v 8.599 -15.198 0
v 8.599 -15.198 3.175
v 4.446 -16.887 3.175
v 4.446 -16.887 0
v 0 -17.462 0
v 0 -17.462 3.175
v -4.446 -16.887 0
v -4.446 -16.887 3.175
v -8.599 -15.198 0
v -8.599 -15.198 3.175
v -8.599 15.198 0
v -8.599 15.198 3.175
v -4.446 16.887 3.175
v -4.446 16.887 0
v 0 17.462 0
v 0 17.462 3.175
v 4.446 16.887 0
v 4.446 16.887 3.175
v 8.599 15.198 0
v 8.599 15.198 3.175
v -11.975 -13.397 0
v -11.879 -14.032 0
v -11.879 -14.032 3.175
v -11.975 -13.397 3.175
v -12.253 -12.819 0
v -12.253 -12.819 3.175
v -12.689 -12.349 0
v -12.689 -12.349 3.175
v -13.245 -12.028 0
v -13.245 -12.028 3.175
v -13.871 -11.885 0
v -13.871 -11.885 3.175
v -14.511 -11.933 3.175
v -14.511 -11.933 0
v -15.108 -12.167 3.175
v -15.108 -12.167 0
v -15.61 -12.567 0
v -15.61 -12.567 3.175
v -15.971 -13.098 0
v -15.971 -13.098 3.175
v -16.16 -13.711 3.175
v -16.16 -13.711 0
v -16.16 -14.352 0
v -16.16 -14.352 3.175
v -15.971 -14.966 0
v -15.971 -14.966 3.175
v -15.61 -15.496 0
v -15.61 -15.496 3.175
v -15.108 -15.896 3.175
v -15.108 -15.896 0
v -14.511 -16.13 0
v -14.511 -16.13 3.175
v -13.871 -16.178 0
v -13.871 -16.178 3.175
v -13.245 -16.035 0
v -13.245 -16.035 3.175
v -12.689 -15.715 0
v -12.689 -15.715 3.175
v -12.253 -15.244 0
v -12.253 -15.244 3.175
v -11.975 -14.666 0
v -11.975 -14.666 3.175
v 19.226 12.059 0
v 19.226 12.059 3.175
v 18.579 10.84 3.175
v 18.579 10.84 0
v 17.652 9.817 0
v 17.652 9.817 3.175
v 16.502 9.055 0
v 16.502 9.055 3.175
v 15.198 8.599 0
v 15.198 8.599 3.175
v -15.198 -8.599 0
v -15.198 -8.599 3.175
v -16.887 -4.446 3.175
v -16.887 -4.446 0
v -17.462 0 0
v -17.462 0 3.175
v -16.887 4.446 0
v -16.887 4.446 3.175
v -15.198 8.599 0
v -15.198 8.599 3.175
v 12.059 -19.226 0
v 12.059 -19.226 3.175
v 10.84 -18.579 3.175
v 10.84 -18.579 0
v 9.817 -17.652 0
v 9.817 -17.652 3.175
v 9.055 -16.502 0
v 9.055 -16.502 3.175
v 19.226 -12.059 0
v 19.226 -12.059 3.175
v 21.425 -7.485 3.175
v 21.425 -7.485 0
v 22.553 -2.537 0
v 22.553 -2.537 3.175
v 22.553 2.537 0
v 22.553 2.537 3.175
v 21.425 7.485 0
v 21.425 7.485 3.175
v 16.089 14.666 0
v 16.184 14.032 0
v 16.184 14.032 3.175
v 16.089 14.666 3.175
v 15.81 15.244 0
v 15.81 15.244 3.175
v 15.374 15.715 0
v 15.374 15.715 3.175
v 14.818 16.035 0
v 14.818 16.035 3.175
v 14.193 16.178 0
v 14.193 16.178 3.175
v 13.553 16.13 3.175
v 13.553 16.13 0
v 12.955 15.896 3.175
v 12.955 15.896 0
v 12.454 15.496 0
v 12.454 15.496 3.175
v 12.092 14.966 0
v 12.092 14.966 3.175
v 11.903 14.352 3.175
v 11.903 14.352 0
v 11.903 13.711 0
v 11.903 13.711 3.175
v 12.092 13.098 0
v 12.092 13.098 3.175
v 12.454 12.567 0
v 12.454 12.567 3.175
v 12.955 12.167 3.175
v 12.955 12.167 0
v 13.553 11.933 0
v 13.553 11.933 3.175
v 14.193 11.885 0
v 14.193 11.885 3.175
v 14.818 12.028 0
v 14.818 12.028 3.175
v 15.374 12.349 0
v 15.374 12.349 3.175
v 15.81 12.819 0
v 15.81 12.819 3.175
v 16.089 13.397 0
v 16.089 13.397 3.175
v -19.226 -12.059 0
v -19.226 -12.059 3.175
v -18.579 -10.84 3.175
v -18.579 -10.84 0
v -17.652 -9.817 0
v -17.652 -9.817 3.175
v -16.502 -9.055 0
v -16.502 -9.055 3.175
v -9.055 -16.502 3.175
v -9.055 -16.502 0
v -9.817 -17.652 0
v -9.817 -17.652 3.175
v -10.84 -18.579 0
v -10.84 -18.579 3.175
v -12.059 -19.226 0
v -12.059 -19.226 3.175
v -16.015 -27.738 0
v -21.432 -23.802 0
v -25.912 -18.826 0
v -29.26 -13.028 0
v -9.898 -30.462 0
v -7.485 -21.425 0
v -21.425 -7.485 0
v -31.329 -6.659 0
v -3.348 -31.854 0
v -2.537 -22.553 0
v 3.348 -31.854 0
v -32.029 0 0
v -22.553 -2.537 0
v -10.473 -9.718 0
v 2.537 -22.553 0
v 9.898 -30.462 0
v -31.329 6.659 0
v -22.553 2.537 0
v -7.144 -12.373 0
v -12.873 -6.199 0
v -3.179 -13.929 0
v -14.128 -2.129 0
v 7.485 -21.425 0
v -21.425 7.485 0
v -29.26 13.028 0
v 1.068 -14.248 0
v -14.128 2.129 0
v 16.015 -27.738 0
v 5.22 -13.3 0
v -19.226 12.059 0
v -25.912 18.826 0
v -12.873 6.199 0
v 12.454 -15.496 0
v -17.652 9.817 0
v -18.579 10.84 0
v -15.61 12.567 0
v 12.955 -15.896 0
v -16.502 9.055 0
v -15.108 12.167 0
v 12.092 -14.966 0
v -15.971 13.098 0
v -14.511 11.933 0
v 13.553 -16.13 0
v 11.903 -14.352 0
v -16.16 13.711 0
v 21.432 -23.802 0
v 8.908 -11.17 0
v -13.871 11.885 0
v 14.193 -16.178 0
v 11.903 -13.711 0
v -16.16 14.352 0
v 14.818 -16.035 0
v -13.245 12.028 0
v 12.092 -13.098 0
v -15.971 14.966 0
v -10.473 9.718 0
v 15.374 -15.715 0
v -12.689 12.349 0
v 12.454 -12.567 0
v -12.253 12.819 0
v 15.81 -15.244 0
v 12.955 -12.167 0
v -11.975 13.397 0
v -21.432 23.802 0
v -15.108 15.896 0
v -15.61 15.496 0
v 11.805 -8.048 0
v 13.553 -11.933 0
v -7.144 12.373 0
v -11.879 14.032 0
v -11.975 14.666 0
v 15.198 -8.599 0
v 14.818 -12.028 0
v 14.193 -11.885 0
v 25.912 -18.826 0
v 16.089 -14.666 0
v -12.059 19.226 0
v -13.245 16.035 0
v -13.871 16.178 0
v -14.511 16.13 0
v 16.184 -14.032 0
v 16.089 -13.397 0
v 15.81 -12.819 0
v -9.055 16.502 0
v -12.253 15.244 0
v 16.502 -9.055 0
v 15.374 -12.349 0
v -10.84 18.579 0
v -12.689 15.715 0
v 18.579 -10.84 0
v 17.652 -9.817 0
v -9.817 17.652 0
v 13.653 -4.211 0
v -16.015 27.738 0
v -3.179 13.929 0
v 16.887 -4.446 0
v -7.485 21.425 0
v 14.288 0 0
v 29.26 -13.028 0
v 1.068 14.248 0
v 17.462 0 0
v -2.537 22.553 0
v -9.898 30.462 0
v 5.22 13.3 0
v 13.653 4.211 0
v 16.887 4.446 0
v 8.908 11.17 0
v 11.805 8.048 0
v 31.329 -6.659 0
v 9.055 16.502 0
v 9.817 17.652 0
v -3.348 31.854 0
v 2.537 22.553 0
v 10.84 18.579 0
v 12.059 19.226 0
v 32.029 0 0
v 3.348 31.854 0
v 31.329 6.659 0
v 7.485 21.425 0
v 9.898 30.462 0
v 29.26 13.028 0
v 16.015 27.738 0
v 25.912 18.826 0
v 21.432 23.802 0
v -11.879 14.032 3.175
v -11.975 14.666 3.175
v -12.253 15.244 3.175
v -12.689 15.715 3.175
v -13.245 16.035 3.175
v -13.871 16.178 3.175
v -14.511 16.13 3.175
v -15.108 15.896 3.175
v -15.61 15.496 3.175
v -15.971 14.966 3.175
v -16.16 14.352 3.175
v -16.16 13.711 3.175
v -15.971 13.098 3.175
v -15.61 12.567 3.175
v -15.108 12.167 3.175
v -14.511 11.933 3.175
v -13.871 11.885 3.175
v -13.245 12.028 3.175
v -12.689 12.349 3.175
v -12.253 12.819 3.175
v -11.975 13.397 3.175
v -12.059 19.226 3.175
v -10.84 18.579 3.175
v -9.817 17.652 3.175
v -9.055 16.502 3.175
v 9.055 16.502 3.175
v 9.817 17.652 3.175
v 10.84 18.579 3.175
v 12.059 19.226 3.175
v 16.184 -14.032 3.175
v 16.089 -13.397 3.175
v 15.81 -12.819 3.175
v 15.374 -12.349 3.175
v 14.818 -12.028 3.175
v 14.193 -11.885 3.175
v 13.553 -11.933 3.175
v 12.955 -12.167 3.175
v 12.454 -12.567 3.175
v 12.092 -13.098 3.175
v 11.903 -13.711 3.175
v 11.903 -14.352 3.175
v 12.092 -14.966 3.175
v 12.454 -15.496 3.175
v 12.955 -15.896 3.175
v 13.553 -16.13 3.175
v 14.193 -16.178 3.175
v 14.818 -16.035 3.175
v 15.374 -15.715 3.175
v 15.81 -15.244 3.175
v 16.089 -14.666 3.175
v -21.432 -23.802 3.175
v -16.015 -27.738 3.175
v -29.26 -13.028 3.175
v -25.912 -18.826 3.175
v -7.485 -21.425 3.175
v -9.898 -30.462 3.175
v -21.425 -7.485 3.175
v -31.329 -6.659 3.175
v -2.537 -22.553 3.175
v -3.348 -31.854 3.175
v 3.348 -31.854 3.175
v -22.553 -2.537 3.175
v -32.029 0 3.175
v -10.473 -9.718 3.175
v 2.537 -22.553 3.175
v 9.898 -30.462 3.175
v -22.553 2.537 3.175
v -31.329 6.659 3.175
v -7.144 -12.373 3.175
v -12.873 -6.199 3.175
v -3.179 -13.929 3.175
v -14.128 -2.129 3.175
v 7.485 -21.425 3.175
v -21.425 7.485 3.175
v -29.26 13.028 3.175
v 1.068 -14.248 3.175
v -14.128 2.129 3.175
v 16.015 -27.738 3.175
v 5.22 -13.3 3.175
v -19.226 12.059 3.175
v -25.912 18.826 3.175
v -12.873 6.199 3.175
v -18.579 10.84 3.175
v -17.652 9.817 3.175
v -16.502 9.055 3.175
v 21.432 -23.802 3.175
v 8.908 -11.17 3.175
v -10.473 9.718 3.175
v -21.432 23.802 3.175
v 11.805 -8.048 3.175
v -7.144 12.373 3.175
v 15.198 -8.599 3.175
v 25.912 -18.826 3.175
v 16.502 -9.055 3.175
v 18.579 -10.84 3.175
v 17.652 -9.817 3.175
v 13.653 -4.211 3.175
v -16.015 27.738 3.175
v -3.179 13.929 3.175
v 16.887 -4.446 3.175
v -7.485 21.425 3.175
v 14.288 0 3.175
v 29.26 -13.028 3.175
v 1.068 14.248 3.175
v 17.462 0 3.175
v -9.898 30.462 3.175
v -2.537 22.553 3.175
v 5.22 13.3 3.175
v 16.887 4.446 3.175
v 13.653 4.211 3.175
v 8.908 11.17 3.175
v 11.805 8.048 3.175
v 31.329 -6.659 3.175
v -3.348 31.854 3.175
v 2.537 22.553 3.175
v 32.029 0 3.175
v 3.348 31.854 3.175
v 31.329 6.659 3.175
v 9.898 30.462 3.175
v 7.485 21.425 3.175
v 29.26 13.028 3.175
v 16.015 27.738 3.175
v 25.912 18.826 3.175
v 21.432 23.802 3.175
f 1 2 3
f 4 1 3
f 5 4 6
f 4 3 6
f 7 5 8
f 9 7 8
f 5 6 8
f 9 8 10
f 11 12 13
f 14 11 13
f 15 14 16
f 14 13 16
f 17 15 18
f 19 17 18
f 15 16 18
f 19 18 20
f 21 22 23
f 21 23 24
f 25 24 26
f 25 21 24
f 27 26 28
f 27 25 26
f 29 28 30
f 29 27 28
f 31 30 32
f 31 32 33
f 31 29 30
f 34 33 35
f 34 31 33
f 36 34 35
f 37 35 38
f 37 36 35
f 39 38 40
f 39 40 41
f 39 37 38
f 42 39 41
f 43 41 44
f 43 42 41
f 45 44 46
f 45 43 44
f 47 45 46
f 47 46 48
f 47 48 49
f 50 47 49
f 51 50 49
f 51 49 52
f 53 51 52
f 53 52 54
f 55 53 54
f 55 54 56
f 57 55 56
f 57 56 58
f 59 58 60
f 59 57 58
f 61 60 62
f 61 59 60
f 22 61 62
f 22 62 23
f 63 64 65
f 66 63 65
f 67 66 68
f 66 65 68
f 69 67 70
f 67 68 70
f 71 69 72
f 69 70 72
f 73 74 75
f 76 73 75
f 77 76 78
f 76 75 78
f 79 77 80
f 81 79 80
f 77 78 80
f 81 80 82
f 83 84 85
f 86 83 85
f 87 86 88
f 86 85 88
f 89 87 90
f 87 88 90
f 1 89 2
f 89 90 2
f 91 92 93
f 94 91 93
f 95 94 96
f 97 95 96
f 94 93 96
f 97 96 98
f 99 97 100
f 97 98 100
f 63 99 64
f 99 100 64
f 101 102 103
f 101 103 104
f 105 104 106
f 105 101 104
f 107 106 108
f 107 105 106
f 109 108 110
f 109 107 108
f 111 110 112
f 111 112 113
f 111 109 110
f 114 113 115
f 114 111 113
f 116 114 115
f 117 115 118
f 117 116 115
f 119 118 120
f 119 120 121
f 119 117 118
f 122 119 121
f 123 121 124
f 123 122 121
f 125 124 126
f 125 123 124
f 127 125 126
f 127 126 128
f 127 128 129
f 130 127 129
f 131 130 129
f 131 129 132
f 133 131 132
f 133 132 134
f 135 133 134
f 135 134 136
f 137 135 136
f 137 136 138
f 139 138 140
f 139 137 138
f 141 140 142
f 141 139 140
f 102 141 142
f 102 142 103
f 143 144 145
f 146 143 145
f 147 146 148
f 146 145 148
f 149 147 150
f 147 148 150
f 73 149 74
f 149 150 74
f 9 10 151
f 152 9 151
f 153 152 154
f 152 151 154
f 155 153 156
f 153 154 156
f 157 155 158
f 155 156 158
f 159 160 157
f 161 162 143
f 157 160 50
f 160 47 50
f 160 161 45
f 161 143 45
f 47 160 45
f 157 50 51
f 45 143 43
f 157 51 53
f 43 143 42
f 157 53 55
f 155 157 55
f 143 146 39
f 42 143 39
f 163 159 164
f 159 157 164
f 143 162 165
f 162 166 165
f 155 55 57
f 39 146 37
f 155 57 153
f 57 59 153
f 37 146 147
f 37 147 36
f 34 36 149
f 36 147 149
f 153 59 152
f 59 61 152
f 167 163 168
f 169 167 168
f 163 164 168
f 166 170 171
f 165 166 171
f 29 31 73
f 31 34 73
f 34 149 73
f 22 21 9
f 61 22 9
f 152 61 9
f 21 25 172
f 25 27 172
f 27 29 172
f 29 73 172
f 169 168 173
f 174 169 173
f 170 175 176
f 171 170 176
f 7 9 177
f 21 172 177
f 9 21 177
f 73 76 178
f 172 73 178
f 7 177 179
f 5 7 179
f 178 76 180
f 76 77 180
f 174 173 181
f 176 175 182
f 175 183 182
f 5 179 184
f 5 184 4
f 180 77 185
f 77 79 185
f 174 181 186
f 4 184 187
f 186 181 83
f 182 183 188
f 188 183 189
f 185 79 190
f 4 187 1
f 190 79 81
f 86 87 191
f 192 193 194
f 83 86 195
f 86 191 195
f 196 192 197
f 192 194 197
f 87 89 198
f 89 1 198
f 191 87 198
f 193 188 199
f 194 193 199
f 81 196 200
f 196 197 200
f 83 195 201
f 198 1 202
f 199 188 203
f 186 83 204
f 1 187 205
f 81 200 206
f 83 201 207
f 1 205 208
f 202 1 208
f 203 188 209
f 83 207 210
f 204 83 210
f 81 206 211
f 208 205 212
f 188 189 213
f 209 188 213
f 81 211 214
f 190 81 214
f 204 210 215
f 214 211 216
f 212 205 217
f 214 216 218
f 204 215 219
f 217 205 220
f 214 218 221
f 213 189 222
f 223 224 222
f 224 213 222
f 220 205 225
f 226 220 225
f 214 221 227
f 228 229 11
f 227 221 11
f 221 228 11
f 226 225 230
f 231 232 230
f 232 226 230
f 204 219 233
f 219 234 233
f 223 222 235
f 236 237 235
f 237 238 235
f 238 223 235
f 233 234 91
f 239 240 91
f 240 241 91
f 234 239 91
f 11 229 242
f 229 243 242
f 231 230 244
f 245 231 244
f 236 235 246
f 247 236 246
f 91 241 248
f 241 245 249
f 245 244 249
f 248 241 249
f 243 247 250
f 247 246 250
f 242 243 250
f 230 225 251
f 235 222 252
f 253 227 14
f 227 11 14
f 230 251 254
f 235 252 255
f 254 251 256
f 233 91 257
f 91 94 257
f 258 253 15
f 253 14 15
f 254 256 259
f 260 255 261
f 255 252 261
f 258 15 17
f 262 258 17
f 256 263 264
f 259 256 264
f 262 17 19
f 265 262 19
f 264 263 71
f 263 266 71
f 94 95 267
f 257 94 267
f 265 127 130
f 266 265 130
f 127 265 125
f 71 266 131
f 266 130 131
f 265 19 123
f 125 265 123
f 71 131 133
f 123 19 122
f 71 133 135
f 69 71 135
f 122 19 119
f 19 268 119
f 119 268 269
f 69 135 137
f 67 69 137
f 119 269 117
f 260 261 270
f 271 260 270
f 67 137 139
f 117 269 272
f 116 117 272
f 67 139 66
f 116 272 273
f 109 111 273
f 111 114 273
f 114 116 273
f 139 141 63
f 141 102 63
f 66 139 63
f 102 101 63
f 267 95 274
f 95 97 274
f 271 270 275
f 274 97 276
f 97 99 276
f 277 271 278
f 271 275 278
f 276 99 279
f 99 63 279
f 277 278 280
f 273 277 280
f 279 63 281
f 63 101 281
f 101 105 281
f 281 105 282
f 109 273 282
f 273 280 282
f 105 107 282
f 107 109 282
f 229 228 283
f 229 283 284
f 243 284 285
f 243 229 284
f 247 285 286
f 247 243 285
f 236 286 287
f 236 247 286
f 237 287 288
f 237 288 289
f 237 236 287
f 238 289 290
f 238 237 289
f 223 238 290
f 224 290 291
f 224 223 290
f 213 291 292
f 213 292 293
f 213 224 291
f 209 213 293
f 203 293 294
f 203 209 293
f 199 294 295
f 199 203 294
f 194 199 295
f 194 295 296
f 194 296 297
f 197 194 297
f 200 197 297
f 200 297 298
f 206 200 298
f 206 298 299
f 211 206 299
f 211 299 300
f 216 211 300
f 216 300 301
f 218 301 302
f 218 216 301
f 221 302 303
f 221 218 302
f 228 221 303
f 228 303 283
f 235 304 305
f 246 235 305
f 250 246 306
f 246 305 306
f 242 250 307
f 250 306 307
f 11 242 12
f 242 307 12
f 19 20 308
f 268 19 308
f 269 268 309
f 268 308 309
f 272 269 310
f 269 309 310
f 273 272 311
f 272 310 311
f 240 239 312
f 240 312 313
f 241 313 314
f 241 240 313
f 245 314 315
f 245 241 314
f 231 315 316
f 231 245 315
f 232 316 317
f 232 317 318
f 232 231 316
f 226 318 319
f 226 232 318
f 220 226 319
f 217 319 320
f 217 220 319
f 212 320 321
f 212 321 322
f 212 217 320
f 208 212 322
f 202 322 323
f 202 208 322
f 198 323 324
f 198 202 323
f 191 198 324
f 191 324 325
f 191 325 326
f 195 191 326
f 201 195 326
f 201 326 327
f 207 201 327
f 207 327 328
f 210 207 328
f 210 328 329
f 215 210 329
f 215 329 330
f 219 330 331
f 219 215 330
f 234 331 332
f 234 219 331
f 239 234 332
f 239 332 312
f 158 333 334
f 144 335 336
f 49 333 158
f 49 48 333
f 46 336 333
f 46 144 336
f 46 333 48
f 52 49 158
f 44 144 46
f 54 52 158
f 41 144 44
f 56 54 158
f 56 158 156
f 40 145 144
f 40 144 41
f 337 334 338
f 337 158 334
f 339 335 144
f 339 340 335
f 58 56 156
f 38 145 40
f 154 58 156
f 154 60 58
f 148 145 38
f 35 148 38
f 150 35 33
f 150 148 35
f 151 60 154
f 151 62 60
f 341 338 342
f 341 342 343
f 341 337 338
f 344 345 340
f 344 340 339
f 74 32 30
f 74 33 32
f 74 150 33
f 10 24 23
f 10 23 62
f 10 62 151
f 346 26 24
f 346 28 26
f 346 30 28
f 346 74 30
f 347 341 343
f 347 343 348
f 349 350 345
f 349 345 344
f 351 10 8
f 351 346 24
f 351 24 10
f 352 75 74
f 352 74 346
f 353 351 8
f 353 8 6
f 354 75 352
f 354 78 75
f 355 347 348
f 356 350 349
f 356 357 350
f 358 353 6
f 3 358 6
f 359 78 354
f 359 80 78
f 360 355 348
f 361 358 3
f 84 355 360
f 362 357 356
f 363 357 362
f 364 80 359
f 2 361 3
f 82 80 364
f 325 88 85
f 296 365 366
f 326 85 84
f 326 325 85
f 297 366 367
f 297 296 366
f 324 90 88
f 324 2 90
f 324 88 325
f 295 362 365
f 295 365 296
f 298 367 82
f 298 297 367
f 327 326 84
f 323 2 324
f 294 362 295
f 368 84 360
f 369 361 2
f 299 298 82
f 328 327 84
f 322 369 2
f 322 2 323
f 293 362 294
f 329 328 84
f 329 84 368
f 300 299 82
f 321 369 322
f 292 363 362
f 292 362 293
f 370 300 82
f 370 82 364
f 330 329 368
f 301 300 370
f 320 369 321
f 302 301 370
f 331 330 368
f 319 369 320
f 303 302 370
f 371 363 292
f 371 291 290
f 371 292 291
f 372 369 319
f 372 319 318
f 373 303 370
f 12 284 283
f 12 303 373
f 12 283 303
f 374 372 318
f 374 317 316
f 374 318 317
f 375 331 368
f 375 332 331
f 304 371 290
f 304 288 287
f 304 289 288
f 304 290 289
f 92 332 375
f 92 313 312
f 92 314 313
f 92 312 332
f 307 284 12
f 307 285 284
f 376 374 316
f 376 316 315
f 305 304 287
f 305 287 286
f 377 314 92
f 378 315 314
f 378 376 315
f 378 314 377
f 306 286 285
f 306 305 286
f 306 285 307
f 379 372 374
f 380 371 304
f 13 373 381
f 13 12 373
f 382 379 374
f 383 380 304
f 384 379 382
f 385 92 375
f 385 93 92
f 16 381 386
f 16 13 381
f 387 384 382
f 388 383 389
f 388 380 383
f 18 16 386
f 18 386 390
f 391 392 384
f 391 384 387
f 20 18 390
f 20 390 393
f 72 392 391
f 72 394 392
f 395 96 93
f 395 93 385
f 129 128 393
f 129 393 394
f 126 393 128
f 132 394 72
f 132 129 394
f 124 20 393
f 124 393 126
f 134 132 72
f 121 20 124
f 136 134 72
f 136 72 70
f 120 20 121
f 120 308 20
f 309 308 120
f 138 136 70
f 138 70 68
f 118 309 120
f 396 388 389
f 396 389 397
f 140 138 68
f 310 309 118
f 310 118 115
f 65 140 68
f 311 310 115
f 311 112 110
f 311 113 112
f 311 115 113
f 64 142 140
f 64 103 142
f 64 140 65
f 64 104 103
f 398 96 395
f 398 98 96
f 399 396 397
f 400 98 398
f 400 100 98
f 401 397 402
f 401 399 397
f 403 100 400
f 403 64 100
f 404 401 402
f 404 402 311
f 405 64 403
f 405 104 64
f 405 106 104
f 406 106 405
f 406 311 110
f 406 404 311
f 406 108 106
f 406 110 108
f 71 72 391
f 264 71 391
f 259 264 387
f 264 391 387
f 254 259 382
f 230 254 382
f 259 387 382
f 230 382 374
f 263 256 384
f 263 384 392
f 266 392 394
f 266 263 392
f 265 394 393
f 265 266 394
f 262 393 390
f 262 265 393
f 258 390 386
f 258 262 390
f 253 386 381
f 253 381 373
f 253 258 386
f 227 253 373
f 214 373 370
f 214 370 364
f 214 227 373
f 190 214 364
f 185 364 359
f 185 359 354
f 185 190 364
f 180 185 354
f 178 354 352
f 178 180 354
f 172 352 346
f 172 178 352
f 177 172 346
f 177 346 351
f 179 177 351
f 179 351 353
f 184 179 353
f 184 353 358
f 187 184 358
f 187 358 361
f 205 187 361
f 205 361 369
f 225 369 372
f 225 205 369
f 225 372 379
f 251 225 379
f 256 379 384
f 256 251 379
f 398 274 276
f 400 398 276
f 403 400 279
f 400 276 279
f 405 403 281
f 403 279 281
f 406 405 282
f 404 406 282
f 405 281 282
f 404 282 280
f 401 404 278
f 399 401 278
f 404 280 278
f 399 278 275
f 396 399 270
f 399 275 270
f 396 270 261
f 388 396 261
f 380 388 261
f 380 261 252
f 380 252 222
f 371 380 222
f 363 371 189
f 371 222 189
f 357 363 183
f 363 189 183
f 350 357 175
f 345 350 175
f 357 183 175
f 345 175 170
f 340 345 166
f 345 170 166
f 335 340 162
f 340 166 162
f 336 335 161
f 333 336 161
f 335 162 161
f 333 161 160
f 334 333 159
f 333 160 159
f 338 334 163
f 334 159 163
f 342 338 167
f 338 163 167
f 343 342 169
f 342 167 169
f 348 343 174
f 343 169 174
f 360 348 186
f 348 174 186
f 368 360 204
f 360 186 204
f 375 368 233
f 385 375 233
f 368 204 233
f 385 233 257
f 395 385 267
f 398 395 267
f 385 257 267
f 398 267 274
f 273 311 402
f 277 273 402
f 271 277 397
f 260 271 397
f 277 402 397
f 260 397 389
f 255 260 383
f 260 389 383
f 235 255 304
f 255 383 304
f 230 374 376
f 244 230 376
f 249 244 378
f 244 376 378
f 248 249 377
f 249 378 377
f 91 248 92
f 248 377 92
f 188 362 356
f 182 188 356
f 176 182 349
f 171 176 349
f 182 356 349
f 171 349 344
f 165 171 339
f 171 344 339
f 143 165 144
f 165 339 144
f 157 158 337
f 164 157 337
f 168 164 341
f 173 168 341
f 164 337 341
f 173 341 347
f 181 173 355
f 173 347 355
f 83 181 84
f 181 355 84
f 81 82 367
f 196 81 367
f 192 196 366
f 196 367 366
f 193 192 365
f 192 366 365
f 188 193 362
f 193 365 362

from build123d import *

# Parameters (mm, degrees)
F0_R            = 32.0294
F0_R_2          = 2.15265
F0_R_3          = 14.2875
F1_DEPTH        = 3.175
F3_DEPTH        = 3.175
F3_COPIES_COUNT = 4


# Not quite as in the source:
# - a pattern or mirror of a feature is missing from the dataset's text; its kind, count and spacing are read off the source's solid


with BuildPart() as f1:
    # F0 (on Top) → F1 (new body)
    with BuildSketch(Plane.XY):
        Circle(F0_R)
        with Locations((-14.0316501892, -14.0316501892)):
            Circle(F0_R_2, mode=Mode.SUBTRACT)
        with Locations((14.0316501892, -14.0316501892)):
            Circle(F0_R_2, mode=Mode.SUBTRACT)
        with Locations((-14.0316501892, 14.0316501892)):
            Circle(F0_R_2, mode=Mode.SUBTRACT)
        Circle(F0_R_3, mode=Mode.SUBTRACT)
        with Locations((14.0316501892, 14.0316501892)):
            Circle(F0_R_2, mode=Mode.SUBTRACT)
    extrude(amount=F1_DEPTH)

    # F2 (on face) → F3 (cut, through all)
    with BuildSketch(Plane.XY.offset(3.175)):
        with BuildLine():
            ThreePointArc((-12.0590655259, 19.2259570543), (-9.8169566913, 17.6521850643), (-8.599282572, 15.1983961488))
            ThreePointArc((-8.599282572, 15.1983961488), (0, 17.4625), (8.599282572, 15.1983961488))
            ThreePointArc((8.599282572, 15.1983961488), (9.8169566913, 17.6521850643), (12.0590655259, 19.2259570543))
            ThreePointArc((12.0590655259, 19.2259570543), (0, 22.6949), (-12.0590655259, 19.2259570543))
        make_face()
    f3 = extrude(amount=-F3_DEPTH, mode=Mode.SUBTRACT)

    # F3_copies: F3 ×4 about axis
    f3_copies_axis = Axis((0, 0, 0), (0, 0, 1))
    for i in range(1, F3_COPIES_COUNT):
        add(f3.rotate(f3_copies_axis, i * 360 / F3_COPIES_COUNT), mode=Mode.SUBTRACT)


solid = f1.part
